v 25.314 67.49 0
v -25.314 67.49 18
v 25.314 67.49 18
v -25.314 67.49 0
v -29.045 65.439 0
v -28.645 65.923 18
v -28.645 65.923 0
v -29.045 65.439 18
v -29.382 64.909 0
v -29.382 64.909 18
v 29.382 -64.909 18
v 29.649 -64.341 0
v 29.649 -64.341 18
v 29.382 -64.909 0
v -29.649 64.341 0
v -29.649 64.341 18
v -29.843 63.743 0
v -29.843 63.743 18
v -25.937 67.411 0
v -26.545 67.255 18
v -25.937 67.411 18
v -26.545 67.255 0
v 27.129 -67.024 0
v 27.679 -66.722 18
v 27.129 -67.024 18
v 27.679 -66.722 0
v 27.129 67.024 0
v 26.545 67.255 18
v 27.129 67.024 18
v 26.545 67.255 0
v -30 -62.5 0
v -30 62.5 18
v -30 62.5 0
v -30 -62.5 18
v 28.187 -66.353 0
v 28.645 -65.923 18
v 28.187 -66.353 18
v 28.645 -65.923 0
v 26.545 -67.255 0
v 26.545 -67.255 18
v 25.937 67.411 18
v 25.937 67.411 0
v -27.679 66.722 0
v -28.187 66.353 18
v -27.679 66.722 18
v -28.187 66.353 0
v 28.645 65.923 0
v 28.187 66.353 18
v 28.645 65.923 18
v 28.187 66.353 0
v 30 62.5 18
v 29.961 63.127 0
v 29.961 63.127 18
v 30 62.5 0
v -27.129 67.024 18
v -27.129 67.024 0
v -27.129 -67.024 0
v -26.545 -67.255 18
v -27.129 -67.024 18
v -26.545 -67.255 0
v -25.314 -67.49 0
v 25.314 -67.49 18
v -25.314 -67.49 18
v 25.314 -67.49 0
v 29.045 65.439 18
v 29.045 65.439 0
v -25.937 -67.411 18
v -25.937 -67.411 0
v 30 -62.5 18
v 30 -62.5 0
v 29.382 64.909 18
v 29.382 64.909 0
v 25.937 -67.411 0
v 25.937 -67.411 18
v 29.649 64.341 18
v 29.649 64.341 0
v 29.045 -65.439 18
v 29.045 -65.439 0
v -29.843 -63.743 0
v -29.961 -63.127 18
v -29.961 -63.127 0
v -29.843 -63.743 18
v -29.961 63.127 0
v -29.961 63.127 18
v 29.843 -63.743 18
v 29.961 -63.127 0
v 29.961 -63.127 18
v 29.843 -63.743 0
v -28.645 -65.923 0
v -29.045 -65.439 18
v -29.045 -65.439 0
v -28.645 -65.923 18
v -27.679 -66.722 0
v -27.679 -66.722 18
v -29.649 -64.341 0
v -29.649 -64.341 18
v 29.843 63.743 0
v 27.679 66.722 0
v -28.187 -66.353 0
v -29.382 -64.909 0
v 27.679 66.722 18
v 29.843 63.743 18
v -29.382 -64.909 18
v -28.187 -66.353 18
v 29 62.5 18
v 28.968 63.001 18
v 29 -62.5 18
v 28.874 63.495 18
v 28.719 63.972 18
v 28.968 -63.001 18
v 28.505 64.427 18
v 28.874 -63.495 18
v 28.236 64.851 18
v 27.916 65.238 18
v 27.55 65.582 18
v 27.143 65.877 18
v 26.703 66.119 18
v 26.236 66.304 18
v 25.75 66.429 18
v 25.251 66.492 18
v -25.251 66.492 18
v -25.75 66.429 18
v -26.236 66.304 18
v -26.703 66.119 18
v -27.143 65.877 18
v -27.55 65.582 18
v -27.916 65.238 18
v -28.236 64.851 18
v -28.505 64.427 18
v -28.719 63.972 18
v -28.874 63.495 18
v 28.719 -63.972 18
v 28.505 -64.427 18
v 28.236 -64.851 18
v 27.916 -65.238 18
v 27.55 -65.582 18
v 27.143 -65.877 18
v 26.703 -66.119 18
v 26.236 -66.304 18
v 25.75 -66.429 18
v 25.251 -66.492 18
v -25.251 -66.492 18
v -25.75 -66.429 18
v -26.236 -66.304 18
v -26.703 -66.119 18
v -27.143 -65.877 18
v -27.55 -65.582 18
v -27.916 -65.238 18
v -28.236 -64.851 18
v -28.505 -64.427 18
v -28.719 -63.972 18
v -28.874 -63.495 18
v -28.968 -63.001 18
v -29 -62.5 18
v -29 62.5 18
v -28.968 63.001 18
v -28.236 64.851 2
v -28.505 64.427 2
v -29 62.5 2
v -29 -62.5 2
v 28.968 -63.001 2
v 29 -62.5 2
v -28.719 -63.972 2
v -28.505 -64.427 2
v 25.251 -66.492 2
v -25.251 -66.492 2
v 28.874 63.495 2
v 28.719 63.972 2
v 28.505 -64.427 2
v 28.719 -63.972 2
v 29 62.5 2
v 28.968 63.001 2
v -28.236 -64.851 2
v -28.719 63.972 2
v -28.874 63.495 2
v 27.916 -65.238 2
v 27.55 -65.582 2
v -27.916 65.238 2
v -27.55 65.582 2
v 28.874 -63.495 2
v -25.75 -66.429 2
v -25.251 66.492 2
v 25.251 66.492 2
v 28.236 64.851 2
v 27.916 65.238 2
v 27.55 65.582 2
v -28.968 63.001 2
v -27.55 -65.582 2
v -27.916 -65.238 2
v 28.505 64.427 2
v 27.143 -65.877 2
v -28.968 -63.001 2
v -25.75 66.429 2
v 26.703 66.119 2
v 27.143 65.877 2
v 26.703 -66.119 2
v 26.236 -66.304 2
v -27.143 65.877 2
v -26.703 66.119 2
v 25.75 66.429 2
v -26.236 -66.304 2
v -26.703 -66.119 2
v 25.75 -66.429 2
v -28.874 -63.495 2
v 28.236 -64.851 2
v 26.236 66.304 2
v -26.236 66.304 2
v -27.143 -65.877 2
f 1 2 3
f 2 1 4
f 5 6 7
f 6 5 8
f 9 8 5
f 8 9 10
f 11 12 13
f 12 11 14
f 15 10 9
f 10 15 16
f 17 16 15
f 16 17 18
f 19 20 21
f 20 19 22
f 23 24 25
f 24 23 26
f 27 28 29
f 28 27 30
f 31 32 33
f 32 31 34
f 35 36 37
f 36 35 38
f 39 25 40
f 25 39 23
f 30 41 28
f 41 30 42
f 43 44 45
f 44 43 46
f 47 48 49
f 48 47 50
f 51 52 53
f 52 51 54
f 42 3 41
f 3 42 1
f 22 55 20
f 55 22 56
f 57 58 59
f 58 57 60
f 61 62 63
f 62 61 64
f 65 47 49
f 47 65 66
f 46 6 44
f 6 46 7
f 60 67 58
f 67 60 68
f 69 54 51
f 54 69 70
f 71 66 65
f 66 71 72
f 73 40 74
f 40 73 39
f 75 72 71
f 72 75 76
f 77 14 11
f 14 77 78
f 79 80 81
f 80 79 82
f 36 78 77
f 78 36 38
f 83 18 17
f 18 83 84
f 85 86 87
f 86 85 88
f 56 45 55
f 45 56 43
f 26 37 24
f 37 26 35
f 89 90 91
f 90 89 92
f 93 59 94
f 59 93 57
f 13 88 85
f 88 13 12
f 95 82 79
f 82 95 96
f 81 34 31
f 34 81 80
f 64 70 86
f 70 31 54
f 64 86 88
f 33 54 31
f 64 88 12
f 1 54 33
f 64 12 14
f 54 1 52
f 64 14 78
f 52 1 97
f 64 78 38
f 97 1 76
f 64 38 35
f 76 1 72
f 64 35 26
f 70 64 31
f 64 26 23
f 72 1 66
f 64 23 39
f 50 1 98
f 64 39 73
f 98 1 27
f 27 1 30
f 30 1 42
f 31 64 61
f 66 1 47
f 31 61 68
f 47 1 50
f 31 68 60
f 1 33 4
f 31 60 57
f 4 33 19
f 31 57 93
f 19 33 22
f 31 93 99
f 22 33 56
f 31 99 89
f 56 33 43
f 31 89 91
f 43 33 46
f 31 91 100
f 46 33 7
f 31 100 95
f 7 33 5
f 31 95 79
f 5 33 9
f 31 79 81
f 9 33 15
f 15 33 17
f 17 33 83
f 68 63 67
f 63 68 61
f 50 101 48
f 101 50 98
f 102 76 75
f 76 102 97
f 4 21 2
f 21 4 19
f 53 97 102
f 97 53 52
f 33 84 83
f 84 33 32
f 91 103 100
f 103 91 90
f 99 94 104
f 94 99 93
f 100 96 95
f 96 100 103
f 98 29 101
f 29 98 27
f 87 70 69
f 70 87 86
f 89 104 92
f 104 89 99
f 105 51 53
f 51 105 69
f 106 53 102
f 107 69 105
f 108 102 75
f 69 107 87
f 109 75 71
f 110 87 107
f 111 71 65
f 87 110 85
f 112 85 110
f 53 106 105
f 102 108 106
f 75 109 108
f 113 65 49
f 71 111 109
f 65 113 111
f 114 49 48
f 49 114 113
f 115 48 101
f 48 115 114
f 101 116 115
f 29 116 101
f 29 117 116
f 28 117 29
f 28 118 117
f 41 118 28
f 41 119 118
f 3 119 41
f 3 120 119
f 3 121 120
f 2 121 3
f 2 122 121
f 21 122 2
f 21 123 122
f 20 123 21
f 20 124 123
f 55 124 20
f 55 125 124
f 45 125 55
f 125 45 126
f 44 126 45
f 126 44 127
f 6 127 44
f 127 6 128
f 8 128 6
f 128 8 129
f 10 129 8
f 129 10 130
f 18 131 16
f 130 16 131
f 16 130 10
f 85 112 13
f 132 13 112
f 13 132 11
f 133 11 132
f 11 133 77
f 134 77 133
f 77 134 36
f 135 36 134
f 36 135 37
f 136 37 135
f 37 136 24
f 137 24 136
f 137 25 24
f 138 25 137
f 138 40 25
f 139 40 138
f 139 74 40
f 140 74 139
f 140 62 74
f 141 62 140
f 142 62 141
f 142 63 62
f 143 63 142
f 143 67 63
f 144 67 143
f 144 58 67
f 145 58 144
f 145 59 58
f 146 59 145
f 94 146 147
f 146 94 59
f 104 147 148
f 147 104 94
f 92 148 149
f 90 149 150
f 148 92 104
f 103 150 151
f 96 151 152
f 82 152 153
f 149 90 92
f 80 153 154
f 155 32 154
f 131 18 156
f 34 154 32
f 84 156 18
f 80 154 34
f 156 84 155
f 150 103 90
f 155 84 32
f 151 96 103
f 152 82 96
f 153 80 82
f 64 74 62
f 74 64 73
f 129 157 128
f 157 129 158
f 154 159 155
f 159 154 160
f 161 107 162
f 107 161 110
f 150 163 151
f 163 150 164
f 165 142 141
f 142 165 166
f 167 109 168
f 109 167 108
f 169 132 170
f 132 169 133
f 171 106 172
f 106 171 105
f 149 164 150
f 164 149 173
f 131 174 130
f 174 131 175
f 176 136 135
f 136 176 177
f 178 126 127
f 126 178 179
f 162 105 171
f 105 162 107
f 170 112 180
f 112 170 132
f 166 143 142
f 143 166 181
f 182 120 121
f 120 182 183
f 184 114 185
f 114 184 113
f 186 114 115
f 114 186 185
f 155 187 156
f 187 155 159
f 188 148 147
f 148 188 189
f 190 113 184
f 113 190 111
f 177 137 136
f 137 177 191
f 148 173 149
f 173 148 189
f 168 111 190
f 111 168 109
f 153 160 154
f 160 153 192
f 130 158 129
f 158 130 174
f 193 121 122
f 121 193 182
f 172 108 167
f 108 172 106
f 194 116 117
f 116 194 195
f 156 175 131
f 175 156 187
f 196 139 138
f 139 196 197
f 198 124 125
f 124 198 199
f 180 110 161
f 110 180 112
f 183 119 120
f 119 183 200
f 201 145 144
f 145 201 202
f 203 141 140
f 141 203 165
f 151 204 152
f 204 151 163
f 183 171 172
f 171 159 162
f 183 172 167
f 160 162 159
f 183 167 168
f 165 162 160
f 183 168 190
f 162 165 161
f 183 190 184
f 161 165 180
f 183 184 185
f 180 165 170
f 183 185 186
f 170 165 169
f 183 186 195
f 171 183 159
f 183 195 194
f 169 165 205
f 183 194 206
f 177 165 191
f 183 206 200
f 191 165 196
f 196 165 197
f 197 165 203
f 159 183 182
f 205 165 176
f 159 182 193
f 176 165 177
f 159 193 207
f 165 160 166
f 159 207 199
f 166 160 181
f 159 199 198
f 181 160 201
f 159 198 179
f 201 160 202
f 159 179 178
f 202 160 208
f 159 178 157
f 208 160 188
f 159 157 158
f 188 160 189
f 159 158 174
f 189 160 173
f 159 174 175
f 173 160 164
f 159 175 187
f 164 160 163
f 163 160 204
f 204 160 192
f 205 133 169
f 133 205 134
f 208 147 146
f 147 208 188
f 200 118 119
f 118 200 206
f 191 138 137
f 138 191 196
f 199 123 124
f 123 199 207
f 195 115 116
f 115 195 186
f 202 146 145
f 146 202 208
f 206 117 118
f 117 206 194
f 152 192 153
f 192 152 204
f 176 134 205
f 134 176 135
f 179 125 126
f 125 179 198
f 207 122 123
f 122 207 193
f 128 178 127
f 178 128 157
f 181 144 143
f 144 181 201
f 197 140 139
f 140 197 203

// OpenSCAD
$fn = 50;


difference() {
	union() {
		hull() {
			translate(v = [-25.0000000000, 62.5000000000, 0]) {
				cylinder(h = 18, r = 5);
			}
			translate(v = [25.0000000000, 62.5000000000, 0]) {
				cylinder(h = 18, r = 5);
			}
			translate(v = [-25.0000000000, -62.5000000000, 0]) {
				cylinder(h = 18, r = 5);
			}
			translate(v = [25.0000000000, -62.5000000000, 0]) {
				cylinder(h = 18, r = 5);
			}
		}
	}
	union() {
		translate(v = [0, 0, 2]) {
			hull() {
				translate(v = [-25.0000000000, 62.5000000000, 0]) {
					cylinder(h = 16, r = 4);
				}
				translate(v = [25.0000000000, 62.5000000000, 0]) {
					cylinder(h = 16, r = 4);
				}
				translate(v = [-25.0000000000, -62.5000000000, 0]) {
					cylinder(h = 16, r = 4);
				}
				translate(v = [25.0000000000, -62.5000000000, 0]) {
					cylinder(h = 16, r = 4);
				}
			}
		}
	}
}
